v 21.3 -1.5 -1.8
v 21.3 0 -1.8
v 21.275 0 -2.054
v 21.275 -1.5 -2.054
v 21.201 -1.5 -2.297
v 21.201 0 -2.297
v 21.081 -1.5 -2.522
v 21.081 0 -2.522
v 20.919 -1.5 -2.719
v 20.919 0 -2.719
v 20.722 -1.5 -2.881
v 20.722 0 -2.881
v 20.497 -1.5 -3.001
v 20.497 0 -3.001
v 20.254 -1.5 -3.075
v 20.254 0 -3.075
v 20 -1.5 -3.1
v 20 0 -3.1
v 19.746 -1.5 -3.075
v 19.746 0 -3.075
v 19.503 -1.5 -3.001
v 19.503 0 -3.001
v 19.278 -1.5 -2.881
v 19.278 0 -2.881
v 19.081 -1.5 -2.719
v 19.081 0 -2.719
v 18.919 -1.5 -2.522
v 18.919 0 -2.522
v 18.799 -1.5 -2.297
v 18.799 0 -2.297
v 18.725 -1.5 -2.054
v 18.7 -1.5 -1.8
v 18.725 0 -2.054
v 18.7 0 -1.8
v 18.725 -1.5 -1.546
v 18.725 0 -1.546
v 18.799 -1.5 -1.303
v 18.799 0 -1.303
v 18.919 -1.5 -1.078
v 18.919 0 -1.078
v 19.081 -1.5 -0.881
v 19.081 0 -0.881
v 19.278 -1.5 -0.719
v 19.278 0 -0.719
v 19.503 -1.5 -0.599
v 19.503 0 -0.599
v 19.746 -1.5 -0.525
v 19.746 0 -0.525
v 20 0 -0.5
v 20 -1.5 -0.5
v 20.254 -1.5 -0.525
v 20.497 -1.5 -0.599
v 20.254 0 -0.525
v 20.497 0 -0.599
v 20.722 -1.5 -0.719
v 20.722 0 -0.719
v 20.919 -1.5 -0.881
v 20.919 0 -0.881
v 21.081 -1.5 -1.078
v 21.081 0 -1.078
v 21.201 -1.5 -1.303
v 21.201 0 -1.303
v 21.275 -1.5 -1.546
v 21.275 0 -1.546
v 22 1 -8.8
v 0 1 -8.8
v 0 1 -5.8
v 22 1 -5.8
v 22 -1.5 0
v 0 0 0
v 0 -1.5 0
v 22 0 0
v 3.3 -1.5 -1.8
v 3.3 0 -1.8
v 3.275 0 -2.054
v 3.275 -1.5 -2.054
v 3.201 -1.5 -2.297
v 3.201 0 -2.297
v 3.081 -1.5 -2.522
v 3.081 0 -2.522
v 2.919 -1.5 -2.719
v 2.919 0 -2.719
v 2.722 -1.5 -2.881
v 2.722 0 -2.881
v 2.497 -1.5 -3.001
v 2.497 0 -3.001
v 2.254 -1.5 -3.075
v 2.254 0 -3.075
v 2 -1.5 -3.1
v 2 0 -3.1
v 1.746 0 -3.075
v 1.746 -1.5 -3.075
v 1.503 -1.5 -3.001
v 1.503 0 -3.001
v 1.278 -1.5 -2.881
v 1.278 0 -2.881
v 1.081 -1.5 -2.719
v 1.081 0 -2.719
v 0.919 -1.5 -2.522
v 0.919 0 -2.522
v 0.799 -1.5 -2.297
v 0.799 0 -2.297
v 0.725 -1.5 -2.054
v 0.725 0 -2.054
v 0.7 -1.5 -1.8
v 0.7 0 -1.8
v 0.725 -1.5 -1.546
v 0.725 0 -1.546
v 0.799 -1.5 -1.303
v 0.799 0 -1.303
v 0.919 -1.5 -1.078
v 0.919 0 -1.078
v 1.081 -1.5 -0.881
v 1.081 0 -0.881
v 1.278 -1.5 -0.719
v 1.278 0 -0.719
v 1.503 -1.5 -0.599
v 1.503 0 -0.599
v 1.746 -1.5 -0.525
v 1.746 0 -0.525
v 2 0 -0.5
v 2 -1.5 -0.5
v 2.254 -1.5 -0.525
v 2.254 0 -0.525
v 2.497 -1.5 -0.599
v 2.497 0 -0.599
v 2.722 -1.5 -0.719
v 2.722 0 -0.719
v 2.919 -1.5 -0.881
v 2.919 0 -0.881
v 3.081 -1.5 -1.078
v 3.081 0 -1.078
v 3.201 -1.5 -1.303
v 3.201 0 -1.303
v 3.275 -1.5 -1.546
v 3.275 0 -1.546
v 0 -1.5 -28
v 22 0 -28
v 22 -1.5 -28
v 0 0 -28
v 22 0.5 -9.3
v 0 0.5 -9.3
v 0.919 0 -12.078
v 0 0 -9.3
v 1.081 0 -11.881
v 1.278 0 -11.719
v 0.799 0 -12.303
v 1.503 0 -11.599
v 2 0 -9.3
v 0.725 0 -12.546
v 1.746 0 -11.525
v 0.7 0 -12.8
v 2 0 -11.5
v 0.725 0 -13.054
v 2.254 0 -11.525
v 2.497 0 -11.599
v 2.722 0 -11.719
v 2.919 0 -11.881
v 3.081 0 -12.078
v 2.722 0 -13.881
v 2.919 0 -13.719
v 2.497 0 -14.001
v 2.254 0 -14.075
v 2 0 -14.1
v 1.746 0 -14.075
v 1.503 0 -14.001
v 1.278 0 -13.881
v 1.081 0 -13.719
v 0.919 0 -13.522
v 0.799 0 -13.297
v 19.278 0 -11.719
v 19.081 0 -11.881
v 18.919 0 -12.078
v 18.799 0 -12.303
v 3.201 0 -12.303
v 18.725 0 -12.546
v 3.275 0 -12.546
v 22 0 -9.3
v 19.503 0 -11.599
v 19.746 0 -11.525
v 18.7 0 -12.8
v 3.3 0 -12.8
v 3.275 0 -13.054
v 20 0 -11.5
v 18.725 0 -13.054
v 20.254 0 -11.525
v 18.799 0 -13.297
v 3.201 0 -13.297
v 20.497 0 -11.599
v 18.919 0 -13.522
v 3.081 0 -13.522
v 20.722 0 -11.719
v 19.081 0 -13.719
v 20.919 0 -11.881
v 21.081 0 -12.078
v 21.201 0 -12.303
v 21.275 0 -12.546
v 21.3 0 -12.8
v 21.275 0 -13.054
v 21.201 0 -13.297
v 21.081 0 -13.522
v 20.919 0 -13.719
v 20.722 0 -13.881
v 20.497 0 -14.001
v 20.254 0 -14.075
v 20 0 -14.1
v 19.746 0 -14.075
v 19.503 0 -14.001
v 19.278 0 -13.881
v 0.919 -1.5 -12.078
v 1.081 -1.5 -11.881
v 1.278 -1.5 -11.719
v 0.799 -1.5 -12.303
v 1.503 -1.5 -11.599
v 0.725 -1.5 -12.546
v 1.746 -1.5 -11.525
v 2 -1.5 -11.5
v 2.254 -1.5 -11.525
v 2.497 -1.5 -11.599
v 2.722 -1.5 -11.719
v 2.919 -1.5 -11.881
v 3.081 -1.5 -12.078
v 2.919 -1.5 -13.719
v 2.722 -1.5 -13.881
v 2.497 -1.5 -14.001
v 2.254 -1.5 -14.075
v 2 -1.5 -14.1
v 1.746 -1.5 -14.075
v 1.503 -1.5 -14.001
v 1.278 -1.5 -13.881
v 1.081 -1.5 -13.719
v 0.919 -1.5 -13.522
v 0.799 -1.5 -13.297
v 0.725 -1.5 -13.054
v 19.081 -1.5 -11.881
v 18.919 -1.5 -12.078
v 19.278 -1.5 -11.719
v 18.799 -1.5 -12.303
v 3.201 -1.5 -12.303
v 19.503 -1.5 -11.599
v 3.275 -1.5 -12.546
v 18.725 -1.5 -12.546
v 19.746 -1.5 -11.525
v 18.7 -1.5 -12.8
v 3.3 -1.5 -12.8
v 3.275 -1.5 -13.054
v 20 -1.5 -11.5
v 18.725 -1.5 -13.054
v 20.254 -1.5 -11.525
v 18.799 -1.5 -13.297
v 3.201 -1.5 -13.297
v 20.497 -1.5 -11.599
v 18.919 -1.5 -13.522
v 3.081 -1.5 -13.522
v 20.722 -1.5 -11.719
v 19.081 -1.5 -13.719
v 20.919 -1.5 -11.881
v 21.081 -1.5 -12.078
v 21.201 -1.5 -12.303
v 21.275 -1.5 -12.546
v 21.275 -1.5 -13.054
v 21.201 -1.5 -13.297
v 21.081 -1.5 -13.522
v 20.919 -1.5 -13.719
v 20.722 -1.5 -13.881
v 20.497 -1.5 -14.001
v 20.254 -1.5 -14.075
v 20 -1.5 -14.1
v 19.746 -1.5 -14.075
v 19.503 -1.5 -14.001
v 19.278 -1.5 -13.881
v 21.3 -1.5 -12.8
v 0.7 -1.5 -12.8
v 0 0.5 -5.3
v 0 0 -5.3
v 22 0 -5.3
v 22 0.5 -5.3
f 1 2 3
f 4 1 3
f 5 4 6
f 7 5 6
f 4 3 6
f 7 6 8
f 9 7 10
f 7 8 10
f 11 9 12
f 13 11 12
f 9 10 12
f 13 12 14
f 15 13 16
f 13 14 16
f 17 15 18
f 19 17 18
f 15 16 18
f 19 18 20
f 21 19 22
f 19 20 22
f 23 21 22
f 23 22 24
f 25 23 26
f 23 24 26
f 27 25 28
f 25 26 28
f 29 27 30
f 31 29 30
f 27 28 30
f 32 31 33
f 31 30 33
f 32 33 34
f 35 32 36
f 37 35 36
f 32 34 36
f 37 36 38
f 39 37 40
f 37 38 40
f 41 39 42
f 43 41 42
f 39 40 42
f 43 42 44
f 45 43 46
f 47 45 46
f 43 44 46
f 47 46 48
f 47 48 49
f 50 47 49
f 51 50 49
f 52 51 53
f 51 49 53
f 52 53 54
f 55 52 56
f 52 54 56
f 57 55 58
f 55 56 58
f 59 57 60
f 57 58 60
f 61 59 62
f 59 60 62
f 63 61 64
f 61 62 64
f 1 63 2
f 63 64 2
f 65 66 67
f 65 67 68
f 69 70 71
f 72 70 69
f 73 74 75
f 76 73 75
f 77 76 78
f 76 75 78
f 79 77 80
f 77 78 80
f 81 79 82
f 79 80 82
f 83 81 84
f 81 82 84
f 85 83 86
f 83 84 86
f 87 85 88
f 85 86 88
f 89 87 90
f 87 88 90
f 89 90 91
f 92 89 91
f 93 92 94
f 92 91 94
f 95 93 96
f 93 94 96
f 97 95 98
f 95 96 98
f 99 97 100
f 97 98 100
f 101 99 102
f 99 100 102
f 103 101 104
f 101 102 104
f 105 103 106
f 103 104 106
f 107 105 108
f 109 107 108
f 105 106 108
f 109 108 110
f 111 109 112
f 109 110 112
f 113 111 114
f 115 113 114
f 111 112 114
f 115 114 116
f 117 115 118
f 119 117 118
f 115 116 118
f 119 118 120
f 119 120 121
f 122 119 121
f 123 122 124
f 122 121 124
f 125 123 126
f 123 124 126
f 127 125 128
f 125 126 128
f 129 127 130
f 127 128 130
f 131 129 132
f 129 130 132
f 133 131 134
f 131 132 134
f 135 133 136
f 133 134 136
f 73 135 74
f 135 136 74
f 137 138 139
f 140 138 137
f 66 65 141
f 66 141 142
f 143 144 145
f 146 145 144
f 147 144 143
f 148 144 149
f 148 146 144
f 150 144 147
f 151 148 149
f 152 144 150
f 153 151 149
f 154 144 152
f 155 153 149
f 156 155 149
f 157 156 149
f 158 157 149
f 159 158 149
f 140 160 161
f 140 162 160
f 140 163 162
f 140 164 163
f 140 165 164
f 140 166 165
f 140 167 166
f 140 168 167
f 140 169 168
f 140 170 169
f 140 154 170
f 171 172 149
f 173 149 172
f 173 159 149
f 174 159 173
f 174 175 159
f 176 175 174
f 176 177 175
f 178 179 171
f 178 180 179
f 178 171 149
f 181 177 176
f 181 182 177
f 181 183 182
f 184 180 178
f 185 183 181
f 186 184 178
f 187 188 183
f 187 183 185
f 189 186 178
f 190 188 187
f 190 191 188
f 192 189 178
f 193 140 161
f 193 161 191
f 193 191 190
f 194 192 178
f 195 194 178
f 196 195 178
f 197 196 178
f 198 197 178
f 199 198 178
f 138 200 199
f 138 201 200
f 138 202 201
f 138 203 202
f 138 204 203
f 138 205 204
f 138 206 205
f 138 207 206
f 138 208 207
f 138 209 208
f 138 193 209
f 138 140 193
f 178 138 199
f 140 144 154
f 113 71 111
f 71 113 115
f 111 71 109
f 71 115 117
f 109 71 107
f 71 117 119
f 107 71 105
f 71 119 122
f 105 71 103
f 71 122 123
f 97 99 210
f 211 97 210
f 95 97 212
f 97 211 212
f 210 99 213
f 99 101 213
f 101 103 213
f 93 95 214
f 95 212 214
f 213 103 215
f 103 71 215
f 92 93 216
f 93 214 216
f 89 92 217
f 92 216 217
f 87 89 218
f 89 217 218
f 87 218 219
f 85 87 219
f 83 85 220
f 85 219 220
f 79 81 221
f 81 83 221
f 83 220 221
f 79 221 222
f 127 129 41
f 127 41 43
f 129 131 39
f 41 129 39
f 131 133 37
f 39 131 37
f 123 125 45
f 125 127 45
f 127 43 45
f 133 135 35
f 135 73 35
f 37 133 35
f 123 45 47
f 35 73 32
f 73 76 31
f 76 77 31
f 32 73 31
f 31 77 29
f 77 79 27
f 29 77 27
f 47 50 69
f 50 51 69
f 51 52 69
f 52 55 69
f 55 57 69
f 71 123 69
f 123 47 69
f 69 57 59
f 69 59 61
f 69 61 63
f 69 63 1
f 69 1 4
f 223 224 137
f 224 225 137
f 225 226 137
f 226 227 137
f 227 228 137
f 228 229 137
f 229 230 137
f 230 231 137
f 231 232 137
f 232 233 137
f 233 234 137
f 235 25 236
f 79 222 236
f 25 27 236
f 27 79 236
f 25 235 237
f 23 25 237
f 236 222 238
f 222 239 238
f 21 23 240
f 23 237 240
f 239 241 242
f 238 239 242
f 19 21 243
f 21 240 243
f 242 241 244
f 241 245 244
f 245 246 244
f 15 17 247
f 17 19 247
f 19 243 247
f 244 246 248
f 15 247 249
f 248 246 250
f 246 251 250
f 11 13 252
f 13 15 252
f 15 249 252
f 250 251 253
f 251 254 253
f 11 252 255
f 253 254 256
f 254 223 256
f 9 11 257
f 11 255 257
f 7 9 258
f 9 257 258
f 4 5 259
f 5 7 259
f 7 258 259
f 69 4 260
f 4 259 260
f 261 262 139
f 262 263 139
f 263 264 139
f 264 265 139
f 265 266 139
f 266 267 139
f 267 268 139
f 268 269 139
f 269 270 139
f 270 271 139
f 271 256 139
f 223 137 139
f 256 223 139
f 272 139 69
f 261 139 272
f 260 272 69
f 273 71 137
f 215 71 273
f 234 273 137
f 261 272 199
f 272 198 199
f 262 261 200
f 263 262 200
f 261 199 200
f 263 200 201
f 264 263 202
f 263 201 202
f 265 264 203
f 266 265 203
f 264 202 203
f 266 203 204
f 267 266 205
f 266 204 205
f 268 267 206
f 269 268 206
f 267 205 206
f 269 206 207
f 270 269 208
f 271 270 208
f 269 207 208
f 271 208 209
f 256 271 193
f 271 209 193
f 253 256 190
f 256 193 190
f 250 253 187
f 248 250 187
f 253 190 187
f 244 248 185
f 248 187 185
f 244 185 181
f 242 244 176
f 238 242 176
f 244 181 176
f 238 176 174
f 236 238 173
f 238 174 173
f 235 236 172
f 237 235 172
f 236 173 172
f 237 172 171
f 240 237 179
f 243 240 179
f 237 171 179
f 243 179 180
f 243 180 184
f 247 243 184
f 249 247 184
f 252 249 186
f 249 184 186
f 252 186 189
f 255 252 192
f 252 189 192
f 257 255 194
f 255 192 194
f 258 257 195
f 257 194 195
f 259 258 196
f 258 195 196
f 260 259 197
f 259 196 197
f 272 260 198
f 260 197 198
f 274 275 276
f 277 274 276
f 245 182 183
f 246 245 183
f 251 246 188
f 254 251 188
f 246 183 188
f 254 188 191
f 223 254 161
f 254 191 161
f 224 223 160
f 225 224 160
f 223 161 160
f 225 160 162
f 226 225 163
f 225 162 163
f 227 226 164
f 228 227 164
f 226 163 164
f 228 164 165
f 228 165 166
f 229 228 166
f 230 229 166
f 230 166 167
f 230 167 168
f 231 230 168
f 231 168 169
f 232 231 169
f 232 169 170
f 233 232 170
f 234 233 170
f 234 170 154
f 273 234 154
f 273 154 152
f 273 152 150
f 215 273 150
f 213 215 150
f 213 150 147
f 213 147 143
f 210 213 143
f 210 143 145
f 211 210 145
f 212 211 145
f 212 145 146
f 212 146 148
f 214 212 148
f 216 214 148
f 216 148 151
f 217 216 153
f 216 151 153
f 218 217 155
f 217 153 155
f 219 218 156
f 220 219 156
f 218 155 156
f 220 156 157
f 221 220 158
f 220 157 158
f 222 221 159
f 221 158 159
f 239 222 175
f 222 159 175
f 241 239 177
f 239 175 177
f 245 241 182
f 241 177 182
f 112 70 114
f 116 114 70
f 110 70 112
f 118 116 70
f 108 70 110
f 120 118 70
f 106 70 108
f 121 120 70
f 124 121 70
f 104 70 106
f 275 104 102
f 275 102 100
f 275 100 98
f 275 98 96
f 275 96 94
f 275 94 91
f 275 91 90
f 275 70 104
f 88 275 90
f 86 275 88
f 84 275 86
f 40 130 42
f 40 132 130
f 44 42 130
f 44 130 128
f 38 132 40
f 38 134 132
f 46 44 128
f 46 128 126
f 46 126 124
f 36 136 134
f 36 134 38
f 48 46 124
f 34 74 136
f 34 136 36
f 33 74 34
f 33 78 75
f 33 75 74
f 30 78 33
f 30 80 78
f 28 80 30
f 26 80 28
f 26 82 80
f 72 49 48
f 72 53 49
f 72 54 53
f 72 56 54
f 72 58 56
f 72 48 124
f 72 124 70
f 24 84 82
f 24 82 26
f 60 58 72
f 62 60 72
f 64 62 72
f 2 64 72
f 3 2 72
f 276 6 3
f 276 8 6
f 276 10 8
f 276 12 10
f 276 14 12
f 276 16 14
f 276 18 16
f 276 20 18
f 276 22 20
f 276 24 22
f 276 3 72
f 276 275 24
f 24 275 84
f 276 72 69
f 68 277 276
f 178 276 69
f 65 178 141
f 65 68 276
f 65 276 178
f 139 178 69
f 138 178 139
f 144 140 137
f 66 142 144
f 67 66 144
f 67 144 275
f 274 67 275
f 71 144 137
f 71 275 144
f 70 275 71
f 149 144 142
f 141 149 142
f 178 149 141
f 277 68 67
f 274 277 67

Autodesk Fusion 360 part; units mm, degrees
sketch "Sketch1" plane through (0, 0, 0) normal (0, 1, 0) x (1, 0, 0)
  line L0 (0, 0) -> (22, 0)
  line L1 (22, 0) -> (22, 28)
  line L2 (22, 28) -> (0, 28)
  line L3 (0, 28) -> (0, 0)
  line L4 (11, 0) -> (11, 0.5)
  line L5 (11, 0.5) -> (2, 0.5)
  circle A0 centre (2, 1.8) radius 1.3
  line L6 (2, 1.8) -> (2, 12.8)
  circle A1 centre (2, 12.8) radius 1.3
  circle A2 centre (20, 1.8) radius 1.3
  circle A3 centre (20, 12.8) radius 1.3
  line L7 (2, 7.3) -> (22, 7.3)
  line L8 (2, 7.3) -> (0, 7.3)
  line L9 (0, 7.3) -> (0, 5.3)
  line L10 (0, 5.3) -> (22, 5.3)
  line L11 (0, 7.3) -> (0, 9.3)
  line L12 (0, 9.3) -> (22, 9.3)
  dimension "d1" = 22
  dimension "d2" = 28
  dimension "d3" = 0.5
  dimension "d4" = 9
  dimension "d5" = 2.6
  dimension "d6" = 11
  dimension "d7" = 2.6
  dimension "d8" = 2
  dimension "d9" = 2
extrude "Extrude1" add sketch "Sketch1" against normal blind 1.5 contours L0 L3 L4 L5 A0 L6 L10 | L0 L1 L4 L5 A0 L6 L10 | L3 L6 L8 L9 L10 | L3 L6 L8 L11 L12 | L1 L6 L7 L10 | L1 L2 L3 L12 | L1 L6 L7 L12
extrude "Extrude2" add sketch "Sketch1" along normal blind 1 contours L3 L6 L8 L9 L10 | L3 L6 L8 L11 L12 | L1 L6 L7 L10 | L1 L6 L7 L12
chamfer "Chamfer1" distance 0.5 angle 45 2 edges at (11, 1, -5.3) (11, 1, -9.3)
equation "d4 = ( 18 / 2 ) * 1 mm"
